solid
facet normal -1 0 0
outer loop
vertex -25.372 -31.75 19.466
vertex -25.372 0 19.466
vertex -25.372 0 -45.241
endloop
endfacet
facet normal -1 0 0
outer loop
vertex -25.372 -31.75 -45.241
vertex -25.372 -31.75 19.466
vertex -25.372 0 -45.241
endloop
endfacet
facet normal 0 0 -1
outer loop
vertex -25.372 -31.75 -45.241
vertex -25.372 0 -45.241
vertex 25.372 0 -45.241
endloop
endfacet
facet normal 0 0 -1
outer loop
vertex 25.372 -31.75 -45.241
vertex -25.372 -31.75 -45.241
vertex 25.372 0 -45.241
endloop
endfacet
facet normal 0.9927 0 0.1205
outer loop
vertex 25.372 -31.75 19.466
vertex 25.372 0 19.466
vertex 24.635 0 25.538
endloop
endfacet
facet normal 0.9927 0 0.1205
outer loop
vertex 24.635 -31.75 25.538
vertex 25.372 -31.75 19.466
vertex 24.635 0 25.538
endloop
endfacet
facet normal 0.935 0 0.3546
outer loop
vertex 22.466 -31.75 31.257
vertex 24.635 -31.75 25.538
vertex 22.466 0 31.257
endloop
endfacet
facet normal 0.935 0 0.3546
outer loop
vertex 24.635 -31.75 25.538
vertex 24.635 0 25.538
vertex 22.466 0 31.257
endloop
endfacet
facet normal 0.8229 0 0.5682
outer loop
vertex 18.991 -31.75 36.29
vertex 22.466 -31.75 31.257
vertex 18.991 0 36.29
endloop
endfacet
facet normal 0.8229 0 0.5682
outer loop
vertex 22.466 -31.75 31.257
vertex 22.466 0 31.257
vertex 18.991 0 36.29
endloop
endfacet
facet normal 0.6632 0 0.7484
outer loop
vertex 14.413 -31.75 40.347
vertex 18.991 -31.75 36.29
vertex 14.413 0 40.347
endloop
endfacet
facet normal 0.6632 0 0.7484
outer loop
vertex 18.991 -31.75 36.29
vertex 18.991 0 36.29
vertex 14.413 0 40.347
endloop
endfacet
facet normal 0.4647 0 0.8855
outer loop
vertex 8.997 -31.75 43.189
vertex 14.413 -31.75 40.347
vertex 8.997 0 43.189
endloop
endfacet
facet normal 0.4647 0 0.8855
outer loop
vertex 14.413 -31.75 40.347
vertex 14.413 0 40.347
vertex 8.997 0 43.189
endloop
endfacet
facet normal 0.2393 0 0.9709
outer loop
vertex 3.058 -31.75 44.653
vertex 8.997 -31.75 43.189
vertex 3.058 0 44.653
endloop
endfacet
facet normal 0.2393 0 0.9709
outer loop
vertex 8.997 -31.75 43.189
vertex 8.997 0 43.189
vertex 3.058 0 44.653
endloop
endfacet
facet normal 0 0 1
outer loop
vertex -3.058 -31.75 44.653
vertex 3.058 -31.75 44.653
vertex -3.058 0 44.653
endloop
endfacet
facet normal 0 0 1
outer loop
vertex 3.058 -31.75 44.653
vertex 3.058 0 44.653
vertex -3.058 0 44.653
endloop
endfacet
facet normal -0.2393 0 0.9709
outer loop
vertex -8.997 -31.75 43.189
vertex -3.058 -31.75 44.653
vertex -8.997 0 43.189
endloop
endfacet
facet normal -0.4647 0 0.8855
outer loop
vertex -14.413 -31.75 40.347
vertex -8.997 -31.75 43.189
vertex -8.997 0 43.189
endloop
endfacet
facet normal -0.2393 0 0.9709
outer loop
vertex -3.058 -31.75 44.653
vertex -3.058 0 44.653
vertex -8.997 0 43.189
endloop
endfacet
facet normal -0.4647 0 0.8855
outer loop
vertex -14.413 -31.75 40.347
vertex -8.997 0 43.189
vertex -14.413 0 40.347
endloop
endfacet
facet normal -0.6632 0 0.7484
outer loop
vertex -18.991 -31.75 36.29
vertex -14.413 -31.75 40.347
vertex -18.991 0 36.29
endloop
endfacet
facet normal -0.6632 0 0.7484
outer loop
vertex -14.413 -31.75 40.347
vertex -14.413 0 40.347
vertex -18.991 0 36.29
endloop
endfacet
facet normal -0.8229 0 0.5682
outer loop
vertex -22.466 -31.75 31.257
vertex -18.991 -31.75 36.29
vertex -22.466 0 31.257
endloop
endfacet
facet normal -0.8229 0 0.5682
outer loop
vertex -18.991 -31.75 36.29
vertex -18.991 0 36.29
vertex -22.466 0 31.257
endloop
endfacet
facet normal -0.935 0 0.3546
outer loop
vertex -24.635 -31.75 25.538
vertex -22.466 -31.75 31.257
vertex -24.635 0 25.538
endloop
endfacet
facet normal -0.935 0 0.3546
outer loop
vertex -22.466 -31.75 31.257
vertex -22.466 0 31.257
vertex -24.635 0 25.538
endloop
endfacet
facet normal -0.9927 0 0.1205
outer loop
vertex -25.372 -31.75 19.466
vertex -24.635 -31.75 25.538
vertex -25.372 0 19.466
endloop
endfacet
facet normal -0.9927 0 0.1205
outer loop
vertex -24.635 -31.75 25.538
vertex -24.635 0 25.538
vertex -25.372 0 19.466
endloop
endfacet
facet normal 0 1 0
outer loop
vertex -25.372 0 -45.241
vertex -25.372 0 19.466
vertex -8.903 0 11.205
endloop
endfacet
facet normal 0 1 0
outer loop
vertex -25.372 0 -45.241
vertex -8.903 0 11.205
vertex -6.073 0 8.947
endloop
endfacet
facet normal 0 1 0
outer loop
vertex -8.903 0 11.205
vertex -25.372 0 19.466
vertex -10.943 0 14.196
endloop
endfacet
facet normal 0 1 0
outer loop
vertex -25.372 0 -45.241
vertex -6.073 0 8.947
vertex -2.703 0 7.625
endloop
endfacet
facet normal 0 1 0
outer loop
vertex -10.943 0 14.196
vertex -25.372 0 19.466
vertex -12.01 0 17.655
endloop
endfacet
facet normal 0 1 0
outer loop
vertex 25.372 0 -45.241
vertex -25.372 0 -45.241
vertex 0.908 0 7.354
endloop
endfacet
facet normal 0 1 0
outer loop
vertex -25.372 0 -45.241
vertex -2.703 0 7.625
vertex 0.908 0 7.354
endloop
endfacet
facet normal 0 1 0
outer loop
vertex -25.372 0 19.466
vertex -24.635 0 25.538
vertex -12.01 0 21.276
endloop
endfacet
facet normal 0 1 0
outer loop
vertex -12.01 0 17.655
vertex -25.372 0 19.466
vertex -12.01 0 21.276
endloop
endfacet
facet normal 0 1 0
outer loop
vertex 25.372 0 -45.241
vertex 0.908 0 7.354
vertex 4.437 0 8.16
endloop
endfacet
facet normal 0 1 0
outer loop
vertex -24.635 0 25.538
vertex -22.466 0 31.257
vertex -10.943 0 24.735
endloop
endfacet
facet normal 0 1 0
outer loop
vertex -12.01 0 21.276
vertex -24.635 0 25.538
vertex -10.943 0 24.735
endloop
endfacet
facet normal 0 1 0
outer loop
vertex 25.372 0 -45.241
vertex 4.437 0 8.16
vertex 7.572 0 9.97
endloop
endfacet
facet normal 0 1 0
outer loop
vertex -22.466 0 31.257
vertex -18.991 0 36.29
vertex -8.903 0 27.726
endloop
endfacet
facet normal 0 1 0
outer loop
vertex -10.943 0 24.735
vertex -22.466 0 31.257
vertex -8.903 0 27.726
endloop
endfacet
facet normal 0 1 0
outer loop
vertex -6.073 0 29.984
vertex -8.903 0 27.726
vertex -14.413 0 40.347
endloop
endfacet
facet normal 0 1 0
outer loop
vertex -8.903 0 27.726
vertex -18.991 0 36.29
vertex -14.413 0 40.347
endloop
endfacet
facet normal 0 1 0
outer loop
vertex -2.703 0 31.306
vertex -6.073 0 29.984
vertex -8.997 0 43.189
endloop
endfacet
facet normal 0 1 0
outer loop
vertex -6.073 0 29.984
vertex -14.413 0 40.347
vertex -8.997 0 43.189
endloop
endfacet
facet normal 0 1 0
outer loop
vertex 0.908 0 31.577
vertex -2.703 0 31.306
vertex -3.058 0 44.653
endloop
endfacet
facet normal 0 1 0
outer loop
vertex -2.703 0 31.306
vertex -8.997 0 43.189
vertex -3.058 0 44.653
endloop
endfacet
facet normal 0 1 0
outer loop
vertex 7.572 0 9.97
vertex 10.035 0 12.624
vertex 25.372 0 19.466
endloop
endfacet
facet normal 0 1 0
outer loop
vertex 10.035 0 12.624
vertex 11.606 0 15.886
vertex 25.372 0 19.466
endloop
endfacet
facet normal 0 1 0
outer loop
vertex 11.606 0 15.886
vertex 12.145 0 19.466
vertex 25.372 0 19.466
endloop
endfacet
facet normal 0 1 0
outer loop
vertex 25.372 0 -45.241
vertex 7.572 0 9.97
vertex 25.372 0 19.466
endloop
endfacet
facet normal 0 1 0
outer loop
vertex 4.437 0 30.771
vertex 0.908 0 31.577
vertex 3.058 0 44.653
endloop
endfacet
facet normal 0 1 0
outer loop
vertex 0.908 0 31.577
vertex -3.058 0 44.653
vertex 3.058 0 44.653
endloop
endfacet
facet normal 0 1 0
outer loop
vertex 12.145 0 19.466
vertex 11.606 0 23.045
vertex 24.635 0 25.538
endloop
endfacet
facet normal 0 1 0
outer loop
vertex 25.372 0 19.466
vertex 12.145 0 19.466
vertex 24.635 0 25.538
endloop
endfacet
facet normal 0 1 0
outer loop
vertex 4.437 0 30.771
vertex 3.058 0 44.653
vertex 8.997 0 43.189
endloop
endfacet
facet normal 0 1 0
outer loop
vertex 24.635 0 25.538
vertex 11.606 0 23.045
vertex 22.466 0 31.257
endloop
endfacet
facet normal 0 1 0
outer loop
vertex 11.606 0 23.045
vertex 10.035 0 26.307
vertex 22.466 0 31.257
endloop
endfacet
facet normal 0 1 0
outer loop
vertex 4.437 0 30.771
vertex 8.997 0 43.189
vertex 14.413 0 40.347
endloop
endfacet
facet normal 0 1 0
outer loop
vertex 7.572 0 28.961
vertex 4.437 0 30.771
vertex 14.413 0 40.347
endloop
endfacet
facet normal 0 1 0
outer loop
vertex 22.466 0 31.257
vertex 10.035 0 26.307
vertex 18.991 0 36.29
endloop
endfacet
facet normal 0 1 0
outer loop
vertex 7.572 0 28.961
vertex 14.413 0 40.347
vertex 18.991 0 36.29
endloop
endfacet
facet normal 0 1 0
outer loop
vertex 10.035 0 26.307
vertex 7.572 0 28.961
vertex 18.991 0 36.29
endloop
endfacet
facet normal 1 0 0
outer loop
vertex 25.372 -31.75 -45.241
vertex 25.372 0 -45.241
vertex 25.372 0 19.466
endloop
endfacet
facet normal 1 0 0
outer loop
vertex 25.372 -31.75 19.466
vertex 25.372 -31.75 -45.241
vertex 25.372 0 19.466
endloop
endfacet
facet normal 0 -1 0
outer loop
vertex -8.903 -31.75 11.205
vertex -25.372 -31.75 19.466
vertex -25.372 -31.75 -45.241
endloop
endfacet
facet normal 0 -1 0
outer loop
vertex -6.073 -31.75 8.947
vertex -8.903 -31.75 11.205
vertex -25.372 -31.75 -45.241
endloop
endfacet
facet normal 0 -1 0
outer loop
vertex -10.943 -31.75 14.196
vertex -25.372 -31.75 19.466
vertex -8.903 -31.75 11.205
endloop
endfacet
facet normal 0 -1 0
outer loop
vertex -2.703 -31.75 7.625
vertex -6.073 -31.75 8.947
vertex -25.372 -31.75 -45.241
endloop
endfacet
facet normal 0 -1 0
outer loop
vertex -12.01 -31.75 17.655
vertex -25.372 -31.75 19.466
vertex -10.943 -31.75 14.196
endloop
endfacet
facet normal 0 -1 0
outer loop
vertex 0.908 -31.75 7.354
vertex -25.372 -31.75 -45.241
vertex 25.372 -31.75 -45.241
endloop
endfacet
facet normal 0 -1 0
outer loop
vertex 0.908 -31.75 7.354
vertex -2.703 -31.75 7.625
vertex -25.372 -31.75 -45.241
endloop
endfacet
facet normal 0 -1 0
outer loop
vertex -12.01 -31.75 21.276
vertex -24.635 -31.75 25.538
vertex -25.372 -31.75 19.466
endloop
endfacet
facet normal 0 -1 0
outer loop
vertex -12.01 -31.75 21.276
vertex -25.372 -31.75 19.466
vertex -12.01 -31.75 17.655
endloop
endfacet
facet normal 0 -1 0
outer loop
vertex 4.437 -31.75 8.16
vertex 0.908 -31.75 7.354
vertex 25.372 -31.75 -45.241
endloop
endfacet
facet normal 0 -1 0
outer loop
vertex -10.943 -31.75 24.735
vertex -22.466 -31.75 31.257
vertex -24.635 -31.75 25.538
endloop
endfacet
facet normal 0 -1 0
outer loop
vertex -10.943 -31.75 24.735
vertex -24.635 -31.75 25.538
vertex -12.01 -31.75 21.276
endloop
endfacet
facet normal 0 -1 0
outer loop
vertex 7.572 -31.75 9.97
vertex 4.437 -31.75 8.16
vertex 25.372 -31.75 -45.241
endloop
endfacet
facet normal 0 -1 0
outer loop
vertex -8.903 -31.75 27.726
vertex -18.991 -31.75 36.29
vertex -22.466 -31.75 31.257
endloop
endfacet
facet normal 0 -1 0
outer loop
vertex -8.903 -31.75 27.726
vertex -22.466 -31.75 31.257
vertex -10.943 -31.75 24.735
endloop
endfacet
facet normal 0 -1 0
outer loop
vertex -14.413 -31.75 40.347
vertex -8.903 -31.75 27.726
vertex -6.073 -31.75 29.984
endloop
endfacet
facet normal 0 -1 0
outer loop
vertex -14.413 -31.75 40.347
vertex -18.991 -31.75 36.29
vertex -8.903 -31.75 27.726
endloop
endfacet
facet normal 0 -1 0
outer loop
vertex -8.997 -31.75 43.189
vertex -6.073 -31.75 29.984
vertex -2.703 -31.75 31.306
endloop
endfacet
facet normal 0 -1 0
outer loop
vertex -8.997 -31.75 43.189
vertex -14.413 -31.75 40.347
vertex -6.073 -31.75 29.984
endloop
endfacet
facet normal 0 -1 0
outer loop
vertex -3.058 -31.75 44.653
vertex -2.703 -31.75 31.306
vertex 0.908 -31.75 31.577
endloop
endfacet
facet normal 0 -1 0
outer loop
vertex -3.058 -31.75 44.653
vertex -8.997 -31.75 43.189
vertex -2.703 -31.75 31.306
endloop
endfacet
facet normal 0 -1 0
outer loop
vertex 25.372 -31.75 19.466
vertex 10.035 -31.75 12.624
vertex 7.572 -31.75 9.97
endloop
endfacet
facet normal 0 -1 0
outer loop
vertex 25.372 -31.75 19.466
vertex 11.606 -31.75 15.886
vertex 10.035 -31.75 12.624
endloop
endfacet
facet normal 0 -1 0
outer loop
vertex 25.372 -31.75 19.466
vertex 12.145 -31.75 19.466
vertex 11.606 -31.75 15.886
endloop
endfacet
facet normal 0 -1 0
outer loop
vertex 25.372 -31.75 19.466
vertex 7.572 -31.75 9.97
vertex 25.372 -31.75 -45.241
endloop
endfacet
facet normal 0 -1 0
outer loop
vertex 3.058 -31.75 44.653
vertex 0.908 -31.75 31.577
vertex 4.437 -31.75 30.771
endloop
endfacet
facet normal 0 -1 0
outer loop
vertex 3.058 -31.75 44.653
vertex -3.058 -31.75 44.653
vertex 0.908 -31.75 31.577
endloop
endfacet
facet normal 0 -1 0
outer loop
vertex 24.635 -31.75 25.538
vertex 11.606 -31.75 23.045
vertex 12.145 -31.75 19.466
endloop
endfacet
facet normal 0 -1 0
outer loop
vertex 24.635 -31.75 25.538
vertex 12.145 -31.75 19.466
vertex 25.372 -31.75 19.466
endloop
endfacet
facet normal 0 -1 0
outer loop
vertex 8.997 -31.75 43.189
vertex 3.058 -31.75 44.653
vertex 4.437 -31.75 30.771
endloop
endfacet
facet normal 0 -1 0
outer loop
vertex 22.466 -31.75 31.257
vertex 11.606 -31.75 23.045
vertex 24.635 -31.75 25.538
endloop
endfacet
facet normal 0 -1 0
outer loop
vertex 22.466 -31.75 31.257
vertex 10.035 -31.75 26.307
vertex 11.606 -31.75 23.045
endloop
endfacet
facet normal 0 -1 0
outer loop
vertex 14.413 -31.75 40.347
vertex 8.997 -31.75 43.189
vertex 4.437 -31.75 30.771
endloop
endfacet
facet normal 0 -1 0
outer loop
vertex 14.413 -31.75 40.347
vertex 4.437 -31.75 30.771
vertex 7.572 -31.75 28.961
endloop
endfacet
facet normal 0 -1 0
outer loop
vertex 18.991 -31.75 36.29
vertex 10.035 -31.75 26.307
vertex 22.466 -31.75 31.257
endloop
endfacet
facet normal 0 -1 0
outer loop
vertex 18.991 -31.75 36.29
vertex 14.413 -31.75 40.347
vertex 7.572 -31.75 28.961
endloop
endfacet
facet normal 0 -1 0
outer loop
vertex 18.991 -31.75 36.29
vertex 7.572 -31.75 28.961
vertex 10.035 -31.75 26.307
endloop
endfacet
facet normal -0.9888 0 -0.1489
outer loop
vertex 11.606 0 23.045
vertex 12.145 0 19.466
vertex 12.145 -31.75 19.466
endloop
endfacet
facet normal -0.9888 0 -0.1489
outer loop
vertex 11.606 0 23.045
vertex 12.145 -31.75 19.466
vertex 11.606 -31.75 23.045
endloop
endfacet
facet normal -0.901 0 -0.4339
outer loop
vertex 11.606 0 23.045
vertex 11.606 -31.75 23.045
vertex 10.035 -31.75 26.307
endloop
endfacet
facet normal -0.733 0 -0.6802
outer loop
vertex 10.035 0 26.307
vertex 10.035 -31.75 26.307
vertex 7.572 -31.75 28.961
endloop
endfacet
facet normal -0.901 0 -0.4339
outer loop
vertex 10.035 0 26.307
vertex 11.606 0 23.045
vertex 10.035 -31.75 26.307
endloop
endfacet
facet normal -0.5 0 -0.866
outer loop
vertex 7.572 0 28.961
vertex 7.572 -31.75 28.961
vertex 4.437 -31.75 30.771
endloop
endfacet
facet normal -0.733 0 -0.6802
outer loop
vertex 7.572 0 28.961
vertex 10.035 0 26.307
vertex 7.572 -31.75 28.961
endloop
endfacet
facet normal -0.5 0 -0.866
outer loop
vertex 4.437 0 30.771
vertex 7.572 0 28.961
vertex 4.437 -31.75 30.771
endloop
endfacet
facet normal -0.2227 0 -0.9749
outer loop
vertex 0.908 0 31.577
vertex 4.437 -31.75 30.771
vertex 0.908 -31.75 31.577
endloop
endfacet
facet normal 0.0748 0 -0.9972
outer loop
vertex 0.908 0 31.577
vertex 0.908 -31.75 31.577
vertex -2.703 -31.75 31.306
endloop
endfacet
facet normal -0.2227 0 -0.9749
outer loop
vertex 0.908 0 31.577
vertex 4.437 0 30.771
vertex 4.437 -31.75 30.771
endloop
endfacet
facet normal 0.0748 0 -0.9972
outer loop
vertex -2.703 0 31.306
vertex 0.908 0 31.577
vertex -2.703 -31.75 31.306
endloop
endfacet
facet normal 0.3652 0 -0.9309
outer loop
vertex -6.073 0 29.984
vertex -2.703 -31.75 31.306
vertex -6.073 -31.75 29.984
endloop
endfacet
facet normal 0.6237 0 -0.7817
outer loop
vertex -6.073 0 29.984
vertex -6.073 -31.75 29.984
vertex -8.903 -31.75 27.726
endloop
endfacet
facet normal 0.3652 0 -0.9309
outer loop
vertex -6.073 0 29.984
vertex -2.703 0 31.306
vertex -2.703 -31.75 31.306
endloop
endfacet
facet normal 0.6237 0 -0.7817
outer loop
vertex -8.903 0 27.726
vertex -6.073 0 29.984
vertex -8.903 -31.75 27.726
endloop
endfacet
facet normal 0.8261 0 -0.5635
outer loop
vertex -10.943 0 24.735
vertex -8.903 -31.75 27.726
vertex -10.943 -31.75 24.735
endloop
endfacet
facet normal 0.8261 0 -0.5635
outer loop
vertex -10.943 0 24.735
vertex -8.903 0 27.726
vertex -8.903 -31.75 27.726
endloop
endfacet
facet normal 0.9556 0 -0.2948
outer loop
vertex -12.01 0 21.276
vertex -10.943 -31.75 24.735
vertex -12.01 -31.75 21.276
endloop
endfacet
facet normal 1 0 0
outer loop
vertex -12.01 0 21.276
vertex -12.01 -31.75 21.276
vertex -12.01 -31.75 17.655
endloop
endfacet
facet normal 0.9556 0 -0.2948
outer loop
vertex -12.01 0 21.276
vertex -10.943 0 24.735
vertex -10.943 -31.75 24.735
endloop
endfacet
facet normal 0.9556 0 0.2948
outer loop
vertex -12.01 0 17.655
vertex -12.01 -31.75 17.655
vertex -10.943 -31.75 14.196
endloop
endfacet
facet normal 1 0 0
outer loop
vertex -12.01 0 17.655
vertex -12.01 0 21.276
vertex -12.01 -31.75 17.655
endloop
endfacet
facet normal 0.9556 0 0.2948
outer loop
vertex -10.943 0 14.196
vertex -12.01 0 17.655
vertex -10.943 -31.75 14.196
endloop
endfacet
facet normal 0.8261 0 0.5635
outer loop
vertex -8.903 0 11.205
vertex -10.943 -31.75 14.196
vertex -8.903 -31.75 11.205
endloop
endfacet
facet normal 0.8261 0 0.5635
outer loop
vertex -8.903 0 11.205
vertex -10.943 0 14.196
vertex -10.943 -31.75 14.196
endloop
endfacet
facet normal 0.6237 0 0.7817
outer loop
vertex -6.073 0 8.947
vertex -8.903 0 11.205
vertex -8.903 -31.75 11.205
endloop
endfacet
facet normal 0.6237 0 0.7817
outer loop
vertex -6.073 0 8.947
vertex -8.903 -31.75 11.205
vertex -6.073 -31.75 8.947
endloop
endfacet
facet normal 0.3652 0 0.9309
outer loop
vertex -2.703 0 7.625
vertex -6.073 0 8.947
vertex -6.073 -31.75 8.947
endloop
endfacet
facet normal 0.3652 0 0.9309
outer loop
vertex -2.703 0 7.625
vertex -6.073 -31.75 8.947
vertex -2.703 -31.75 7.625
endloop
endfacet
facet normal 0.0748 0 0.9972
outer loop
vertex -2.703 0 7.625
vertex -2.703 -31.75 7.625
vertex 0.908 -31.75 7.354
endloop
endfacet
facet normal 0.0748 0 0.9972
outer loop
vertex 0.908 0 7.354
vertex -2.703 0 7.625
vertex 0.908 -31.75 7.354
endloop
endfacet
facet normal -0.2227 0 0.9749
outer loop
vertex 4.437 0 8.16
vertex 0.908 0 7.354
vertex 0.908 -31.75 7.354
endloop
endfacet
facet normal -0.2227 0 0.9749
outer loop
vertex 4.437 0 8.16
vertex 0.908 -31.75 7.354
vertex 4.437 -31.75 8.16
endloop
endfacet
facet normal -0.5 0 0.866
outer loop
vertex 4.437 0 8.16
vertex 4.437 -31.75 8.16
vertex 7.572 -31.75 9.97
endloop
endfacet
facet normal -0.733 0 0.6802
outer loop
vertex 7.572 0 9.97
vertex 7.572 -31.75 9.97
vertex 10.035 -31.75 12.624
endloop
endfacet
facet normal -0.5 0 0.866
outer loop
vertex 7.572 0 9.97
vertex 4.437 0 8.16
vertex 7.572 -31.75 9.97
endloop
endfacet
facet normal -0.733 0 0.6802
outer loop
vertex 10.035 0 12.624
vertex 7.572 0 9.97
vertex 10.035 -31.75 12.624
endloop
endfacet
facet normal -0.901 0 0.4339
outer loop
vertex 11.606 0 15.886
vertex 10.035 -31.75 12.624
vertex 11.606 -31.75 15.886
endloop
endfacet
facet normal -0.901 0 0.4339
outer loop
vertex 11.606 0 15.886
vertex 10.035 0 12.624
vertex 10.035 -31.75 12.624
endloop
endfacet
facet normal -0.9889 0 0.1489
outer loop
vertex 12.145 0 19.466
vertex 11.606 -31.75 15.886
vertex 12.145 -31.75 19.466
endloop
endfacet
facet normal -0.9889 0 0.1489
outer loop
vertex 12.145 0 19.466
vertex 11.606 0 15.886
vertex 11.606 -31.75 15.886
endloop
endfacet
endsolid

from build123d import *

# Parameters (mm, degrees)
F0_R     = 12.145275
F1_DEPTH = 31.75


with BuildPart() as f1:
    # F0 (on Front) → F1 (new body)
    with BuildSketch(Plane.XZ):
        with BuildLine():
            ThreePointArc((25.372297, 19.465521), (-1e-06, 44.837818), (-25.372298, 19.465521))
            Line((-25.372298, 19.465521), (-25.372298, -45.240555))
            Line((-25.372298, -45.240555), (25.372297, -45.240555))
            Line((25.372297, -45.240555), (25.372297, 19.465521))
        make_face()
        with Locations((-1e-06, 19.465521)):
            Circle(F0_R, mode=Mode.SUBTRACT)
    extrude(amount=F1_DEPTH)


solid = f1.part
